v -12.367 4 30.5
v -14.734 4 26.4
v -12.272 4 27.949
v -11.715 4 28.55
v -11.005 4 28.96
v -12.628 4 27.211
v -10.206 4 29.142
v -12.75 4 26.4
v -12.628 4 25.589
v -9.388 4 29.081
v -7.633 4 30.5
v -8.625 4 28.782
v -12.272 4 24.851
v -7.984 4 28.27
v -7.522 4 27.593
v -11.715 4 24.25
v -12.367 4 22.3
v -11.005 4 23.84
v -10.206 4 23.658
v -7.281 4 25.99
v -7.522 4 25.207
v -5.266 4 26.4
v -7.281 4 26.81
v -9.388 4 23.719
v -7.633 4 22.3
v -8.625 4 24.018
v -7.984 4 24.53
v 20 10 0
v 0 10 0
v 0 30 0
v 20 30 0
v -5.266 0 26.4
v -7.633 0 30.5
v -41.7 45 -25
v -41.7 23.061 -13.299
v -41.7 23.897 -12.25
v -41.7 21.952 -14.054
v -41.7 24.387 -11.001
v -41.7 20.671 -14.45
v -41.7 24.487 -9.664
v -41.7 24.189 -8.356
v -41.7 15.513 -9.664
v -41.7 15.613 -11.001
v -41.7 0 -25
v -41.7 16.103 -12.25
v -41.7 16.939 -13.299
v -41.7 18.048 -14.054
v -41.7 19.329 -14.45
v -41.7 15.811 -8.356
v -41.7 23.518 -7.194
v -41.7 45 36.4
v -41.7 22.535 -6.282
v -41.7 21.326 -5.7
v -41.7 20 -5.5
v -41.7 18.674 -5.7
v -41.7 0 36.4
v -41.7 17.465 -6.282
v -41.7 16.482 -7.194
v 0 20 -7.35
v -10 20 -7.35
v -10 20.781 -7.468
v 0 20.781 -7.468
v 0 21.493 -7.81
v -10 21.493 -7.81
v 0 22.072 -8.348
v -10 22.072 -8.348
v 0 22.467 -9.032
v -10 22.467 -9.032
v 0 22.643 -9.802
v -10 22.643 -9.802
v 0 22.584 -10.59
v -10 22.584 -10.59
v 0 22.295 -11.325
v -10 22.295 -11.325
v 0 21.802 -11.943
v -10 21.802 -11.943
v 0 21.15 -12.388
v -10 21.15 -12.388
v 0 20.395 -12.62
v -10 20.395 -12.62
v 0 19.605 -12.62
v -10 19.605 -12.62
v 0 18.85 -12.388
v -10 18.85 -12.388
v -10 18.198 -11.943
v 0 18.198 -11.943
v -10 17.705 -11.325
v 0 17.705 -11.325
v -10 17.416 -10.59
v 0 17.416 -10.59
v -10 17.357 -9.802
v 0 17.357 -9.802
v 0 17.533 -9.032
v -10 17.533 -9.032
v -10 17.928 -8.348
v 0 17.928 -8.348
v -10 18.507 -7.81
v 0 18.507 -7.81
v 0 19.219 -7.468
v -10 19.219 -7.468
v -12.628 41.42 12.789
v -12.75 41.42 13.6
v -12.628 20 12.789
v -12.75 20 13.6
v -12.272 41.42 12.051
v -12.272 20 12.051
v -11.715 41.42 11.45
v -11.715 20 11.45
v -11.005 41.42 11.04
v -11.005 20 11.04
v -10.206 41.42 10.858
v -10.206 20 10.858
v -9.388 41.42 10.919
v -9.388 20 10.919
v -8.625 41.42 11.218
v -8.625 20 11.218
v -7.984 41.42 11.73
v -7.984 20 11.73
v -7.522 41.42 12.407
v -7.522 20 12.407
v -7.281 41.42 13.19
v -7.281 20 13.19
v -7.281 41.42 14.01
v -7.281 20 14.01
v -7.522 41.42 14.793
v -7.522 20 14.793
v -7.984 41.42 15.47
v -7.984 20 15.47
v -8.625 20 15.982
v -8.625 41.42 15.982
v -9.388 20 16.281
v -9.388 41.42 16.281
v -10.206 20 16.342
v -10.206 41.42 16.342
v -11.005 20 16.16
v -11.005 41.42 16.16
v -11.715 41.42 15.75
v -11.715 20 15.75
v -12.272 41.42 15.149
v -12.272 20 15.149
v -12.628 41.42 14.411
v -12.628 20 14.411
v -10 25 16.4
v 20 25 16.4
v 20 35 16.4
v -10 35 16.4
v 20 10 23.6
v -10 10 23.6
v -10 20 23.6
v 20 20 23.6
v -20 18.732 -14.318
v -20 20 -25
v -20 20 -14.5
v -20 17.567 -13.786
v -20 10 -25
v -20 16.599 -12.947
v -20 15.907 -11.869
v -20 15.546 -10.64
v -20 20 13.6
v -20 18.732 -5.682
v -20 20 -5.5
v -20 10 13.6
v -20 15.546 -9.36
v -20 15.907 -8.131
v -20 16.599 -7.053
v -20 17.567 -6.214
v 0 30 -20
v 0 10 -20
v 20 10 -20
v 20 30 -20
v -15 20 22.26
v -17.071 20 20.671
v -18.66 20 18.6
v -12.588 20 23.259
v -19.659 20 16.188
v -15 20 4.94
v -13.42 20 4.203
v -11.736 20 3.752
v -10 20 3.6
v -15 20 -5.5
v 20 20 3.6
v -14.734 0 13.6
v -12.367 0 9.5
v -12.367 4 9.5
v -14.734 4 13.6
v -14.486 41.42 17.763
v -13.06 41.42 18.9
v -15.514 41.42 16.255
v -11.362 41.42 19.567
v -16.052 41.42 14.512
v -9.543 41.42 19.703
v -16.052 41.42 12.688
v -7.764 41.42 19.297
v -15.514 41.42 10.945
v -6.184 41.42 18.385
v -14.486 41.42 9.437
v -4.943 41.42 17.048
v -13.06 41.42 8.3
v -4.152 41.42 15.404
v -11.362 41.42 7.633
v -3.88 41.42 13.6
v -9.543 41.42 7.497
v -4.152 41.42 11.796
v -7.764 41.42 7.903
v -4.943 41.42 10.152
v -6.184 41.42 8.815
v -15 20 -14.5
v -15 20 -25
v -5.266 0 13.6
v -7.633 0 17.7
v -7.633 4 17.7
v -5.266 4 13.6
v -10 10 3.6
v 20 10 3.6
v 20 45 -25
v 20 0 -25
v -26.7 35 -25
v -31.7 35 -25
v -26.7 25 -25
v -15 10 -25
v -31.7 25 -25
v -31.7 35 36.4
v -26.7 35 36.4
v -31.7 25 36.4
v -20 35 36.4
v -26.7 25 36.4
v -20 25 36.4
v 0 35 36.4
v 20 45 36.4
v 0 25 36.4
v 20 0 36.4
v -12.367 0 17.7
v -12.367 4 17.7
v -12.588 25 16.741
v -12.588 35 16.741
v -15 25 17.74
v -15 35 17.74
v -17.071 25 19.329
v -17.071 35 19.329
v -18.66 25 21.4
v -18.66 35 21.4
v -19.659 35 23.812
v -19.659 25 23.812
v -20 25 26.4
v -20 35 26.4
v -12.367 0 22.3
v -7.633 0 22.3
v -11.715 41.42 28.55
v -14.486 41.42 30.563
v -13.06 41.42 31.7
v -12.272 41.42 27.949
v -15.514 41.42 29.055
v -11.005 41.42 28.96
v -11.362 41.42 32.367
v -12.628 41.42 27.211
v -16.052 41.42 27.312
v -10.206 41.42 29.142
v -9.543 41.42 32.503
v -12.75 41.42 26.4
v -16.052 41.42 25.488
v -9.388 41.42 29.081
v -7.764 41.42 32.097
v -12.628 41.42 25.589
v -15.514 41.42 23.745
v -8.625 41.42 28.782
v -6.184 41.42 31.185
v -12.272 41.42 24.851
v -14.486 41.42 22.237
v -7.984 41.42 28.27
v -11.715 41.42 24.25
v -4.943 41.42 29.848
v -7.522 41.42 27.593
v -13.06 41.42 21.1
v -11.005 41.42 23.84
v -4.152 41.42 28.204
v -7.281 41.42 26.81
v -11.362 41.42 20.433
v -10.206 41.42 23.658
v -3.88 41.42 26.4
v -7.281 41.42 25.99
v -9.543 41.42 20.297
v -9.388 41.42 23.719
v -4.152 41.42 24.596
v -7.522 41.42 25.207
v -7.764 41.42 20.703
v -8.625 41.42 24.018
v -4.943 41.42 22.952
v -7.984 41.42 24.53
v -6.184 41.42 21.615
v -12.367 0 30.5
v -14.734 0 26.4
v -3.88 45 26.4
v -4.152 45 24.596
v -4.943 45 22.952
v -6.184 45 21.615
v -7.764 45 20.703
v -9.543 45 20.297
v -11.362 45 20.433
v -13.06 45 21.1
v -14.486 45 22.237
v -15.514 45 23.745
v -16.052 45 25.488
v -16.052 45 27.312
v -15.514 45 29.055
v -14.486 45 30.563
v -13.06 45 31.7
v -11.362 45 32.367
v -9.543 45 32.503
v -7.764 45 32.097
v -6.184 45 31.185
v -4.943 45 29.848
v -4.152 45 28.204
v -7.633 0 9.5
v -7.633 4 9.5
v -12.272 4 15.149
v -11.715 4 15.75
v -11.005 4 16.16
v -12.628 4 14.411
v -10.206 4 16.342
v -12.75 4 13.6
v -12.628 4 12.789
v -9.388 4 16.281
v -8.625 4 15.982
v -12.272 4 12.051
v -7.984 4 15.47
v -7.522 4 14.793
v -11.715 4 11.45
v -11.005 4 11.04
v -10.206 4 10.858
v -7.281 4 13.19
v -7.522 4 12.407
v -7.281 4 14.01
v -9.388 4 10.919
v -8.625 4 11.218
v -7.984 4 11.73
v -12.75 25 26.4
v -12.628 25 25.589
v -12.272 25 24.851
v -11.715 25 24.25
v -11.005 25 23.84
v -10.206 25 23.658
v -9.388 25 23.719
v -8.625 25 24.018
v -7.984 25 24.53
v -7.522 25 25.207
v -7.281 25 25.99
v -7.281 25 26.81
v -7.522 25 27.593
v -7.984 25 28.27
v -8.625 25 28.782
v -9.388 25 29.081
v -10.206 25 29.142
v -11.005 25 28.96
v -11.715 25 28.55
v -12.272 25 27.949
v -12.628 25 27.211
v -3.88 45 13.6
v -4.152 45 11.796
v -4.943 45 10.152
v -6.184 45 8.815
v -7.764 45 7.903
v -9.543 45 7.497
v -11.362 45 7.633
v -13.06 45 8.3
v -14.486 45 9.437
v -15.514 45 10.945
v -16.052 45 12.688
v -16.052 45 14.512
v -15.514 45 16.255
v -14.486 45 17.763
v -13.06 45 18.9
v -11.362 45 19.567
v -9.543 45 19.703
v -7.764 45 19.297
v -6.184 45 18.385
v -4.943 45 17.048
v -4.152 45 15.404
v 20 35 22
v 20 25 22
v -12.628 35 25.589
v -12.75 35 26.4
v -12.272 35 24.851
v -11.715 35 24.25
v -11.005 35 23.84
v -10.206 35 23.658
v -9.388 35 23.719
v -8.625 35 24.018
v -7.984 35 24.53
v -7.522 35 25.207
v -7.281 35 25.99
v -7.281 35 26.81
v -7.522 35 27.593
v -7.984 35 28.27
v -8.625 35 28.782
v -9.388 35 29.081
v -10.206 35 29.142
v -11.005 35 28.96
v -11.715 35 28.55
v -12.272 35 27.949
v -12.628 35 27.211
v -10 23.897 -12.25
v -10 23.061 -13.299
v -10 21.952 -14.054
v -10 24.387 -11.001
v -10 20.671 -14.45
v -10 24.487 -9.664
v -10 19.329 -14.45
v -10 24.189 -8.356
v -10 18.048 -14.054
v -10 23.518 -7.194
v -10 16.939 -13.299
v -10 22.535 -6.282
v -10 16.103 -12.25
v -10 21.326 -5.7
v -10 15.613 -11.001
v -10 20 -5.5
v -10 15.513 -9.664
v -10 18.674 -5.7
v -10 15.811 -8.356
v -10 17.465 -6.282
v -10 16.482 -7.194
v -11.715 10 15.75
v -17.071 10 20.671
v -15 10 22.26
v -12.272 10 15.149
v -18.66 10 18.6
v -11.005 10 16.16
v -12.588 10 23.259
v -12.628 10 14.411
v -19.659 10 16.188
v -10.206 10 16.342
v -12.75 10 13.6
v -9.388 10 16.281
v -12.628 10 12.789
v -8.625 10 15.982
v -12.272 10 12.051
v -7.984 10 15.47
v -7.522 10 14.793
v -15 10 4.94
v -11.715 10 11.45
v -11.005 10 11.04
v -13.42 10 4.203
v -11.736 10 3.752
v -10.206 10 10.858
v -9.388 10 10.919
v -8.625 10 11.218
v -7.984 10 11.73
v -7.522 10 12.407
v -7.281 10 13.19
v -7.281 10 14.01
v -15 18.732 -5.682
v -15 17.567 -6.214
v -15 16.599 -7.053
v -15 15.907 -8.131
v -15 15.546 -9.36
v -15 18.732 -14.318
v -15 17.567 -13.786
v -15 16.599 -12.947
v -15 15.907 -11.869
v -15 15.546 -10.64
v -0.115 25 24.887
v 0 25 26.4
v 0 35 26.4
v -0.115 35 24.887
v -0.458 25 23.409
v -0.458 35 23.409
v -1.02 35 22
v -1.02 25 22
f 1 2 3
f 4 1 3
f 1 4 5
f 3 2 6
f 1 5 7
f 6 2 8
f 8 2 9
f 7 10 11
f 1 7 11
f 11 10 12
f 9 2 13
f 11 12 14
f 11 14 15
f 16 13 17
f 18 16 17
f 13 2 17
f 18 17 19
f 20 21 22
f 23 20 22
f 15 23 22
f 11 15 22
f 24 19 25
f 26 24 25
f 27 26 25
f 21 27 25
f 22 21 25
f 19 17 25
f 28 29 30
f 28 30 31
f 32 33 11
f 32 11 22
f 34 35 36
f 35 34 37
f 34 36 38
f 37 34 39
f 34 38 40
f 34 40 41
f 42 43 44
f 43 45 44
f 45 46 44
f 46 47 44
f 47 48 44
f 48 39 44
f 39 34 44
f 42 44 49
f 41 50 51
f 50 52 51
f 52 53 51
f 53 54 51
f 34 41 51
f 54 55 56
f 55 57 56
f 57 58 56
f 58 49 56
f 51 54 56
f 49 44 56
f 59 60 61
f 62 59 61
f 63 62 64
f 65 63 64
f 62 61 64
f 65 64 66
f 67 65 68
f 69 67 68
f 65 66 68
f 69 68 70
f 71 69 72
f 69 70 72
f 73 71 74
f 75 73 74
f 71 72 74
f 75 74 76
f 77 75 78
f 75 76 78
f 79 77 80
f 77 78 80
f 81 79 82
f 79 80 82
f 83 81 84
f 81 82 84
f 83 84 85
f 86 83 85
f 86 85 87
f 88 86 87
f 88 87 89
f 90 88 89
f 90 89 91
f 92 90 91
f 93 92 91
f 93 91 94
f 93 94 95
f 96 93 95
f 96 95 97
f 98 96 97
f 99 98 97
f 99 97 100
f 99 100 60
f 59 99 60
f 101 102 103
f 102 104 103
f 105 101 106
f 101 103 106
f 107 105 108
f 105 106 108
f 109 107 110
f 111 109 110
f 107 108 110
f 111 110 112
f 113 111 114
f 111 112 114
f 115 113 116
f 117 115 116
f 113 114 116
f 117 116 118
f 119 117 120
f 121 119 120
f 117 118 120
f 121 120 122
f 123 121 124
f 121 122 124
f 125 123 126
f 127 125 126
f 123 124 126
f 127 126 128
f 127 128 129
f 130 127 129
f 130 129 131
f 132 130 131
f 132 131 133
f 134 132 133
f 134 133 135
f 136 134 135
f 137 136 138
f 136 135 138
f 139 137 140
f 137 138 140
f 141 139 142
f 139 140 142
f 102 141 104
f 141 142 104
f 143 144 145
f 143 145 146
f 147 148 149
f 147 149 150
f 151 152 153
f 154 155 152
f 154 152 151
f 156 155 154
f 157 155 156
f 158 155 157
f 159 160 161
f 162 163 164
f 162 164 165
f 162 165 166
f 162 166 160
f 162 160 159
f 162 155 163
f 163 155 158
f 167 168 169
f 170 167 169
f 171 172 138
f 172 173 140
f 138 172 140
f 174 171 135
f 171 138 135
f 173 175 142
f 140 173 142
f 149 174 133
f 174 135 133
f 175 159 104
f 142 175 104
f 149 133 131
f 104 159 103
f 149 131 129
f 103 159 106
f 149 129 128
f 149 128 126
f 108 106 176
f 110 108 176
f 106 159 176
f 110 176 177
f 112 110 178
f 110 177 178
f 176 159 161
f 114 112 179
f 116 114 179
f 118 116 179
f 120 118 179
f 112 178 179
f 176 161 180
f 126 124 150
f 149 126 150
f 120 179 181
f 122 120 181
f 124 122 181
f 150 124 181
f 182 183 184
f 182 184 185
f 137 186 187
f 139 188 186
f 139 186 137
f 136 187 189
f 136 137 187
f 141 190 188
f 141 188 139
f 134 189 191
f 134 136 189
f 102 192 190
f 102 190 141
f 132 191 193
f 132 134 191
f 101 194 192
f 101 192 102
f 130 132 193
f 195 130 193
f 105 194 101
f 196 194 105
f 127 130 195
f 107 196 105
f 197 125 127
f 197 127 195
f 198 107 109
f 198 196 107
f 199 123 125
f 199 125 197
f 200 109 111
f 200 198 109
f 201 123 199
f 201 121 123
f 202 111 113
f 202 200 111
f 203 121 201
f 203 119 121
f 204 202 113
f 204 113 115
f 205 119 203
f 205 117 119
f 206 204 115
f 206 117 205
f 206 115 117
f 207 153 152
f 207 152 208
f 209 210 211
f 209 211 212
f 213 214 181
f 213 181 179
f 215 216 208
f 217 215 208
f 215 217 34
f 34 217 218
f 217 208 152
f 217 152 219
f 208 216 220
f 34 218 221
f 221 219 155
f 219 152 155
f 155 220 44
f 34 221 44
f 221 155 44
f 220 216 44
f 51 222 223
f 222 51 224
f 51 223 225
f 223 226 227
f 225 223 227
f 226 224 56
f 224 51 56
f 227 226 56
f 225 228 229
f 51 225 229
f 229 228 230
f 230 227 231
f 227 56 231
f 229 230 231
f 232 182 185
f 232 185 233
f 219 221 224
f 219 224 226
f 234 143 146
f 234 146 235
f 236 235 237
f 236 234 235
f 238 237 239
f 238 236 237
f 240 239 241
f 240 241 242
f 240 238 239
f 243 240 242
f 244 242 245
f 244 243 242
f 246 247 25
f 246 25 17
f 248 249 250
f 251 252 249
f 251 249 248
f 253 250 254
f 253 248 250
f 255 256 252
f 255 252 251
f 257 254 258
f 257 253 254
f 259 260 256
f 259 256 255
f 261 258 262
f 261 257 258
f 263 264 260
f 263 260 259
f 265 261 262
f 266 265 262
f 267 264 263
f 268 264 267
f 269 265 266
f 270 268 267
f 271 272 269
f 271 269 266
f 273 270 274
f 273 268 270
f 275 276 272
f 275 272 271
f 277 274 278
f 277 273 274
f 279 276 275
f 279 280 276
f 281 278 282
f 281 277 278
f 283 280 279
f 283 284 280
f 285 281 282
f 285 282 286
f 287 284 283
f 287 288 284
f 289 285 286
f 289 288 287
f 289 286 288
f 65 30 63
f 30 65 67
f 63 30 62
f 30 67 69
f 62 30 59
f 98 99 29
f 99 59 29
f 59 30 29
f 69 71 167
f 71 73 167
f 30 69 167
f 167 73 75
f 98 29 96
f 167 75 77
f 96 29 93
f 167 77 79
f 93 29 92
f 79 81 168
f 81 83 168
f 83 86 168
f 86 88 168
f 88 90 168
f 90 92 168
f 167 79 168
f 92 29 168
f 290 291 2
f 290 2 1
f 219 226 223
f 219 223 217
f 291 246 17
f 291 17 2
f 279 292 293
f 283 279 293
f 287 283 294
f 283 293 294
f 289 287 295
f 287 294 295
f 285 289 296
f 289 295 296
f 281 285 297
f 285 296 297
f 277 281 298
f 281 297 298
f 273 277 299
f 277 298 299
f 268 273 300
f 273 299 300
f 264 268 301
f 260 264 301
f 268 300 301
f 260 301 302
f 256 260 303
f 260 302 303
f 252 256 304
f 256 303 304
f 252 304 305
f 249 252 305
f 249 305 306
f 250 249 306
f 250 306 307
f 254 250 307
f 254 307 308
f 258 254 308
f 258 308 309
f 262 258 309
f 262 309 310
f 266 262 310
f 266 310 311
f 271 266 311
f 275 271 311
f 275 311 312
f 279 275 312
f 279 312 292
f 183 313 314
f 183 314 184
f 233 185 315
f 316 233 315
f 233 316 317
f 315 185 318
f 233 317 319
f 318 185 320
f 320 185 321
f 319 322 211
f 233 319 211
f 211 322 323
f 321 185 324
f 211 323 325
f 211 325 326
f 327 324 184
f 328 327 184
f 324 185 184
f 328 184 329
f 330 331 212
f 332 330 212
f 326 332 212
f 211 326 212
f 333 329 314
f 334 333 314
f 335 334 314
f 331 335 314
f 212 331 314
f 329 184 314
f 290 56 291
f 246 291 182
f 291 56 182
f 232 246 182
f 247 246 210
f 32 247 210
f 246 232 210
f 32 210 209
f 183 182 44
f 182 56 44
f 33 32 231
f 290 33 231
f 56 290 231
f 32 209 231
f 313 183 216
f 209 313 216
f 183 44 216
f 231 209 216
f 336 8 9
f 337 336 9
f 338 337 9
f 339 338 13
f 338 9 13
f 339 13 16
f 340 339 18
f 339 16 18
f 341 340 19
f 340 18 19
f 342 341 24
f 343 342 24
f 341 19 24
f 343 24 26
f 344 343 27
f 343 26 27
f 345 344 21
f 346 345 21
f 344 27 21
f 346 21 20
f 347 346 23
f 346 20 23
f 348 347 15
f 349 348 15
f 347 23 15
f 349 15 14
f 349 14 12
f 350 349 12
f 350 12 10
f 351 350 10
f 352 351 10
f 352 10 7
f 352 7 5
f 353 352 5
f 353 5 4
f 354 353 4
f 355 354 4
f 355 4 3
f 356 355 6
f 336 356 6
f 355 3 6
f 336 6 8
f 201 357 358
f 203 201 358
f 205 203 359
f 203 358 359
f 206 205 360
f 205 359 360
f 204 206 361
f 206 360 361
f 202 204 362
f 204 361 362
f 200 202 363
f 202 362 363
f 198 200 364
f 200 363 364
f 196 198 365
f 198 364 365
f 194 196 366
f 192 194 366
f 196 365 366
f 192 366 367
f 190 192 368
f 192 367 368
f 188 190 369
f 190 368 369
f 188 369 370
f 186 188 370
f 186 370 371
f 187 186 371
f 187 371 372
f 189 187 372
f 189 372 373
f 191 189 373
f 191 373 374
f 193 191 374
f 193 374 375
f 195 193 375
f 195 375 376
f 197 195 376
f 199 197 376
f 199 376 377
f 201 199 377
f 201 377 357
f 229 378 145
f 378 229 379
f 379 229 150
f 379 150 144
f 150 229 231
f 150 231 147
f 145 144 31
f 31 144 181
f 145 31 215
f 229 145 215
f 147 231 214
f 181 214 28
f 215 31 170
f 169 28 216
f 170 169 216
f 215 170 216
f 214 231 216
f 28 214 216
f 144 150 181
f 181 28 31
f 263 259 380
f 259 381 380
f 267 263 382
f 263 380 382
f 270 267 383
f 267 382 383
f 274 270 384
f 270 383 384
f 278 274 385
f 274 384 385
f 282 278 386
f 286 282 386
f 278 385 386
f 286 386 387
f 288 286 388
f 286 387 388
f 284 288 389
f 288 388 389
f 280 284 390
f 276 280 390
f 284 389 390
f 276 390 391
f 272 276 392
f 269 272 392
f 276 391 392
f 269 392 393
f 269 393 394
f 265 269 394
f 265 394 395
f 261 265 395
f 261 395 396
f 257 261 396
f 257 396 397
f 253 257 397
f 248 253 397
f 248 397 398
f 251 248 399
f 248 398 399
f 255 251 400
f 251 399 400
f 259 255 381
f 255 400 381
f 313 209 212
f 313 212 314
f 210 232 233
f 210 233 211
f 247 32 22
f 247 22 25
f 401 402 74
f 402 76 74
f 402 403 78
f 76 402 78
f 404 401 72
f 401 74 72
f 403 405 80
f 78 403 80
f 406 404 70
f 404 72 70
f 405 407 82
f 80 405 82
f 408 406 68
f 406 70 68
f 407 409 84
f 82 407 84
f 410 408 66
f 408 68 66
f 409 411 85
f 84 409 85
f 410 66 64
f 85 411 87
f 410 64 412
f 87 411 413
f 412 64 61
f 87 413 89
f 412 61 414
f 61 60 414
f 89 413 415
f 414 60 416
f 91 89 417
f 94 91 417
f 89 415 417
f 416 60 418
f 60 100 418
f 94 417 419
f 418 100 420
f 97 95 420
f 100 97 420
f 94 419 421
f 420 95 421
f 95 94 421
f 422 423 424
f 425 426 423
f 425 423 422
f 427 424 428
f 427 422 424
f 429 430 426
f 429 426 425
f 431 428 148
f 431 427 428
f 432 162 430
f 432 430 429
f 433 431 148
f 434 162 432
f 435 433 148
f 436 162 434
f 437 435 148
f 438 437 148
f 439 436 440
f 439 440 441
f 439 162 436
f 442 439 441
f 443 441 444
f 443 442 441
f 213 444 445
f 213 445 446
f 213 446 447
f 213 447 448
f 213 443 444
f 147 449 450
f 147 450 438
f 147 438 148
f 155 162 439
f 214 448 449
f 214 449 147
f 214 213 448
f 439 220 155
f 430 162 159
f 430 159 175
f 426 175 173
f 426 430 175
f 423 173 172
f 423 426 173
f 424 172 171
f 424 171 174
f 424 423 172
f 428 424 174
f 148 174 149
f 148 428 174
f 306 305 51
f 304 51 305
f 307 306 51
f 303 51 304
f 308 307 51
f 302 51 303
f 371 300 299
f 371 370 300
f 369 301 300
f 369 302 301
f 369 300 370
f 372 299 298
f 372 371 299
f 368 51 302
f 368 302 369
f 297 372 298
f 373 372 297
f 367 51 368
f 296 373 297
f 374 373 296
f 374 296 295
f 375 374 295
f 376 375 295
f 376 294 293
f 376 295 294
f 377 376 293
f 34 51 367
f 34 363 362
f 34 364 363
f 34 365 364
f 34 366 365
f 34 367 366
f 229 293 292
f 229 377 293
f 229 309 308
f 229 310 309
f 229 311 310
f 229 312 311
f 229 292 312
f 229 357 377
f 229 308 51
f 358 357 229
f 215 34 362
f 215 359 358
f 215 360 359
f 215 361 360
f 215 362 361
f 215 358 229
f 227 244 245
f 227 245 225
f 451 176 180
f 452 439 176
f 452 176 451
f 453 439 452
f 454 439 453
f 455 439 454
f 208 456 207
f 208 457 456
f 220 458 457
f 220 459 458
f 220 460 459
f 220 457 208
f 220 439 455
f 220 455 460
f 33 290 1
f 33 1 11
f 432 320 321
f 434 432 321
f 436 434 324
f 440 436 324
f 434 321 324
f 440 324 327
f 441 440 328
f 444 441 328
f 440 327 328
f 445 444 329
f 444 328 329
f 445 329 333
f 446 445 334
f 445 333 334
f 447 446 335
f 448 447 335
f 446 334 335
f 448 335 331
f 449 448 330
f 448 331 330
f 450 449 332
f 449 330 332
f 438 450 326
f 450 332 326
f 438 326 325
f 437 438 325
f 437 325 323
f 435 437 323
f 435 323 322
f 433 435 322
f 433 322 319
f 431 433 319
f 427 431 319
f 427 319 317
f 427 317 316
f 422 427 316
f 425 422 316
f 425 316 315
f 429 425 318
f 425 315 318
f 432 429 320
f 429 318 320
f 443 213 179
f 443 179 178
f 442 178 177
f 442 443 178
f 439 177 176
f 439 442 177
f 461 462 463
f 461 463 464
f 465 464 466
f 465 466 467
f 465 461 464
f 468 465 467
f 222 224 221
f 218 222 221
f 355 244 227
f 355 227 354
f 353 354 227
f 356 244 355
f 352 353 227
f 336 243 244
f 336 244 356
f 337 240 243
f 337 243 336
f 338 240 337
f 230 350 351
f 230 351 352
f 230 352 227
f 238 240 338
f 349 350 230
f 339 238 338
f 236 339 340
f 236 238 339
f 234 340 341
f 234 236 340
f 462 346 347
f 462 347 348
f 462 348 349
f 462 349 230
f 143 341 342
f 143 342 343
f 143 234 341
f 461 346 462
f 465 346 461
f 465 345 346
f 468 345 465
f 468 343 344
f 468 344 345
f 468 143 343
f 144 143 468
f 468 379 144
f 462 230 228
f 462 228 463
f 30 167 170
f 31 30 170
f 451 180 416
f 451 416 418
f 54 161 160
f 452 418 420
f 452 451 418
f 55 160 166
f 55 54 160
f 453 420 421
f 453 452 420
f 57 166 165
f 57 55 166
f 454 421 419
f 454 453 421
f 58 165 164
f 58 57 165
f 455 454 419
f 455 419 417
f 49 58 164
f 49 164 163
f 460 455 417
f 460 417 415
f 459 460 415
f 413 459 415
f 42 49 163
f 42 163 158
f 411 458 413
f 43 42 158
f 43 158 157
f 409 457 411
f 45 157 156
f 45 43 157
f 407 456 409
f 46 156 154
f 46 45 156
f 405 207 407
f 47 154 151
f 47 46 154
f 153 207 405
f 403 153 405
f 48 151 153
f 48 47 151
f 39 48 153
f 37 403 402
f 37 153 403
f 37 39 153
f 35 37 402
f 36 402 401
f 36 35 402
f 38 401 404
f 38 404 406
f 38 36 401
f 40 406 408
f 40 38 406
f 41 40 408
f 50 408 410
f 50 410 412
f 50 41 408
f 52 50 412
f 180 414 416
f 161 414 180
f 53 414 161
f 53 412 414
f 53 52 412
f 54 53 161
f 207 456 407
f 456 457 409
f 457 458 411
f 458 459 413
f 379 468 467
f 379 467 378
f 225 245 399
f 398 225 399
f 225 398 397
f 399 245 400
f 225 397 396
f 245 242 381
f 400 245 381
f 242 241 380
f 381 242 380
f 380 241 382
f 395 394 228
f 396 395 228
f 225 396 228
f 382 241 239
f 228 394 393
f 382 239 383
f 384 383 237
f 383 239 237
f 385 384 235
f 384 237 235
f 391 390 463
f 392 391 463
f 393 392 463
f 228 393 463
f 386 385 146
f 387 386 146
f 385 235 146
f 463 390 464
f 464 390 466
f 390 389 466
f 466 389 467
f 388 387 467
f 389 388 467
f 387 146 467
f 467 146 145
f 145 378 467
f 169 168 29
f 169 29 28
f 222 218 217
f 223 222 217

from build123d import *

# Parameters (mm, degrees)
MAIN_BLOCK_DEPTH                        = 45
BOTTOM_IDLER_CUTOUT_DEPTH               = 10
TOP_IDLER_CUTOUT_DEPTH                  = 10
BELT_PASSTHROUGH_SKETCH_W               = 5
BELT_PASSTHROUGH_SKETCH_H               = 61.4
BELT_PASSTHROUGH_DEPTH                  = 10
F_2020VSLOTCUTOUTSKETCH_W               = 20
F_2020VSLOTCUTOUTSKETCH_H               = 20
EXTRUSIONMOUNTINGSLOT_DEPTH             = 20
CBORE_FOR_M5_HEX_HEAD_BOLT1_D           = 5.5
CBORE_FOR_M5_HEX_HEAD_BOLT1_CBORE_D     = 12.24
CBORE_FOR_M5_HEX_HEAD_BOLT1_CBORE_DEPTH = 3.58
NUTTRAPS_DEPTH                          = 4
EXTRUSIONMOUNTINGCOUNTERBORESKETCH_R    = 4.5
EXTRUSIONMOUNTINGCOUNTERBORE_DEPTH      = 31.7
EXTRUSIONMOUNTINGHOLESKETCH_R           = 2.65
EXTRUSIONMOUNTINGHOLE_DEPTH             = 66.991287304


with BuildPart() as part:
    # MainBlockSketch → Main Block (new body)
    with BuildSketch(Plane(origin=(0, 0, 0), x_dir=(1, 0, 0), z_dir=(0, 1, 0))):
        Polygon((-41.7, -36.4), (20, -36.4), (20, -20), (20, -15), (20, 0), (20, 20), (20, 25), (-41.7, 25), (-41.7, 20), (-41.7, -15), align=None)
    extrude(amount=MAIN_BLOCK_DEPTH)

    # Bottom Idler Cutout Sketch → Bottom Idler Cutout (cut)
    with BuildSketch(Plane(origin=(0, 10, 0), x_dir=(1, 0, 0), z_dir=(0, 1, 0))):
        with BuildLine():
            Line((-10, -23.6), (20, -23.6))
            Line((20, -23.6), (20, -3.6))
            Line((20, -3.6), (-10, -3.6))
            ThreePointArc((-10, -3.6), (-12.588190451, -3.940741737), (-15, -4.939745962))
            Line((-15, -4.939745962), (-15, 25))
            Line((-15, 25), (-20, 25))
            Line((-20, 25), (-20, -13.6))
            ThreePointArc((-20, -13.6), (-17.071067812, -20.671067812), (-10, -23.6))
        make_face()
    extrude(amount=BOTTOM_IDLER_CUTOUT_DEPTH, mode=Mode.SUBTRACT)

    # Top Idler Cutout Sketch → Top Idler Cutout (cut)
    with BuildSketch(Plane(origin=(0, 25, 0), x_dir=(1, 0, 0), z_dir=(0, 1, 0))):
        with BuildLine():
            Line((-20, -26.4), (-20, -36.4))
            Line((-20, -36.4), (0, -36.4))
            Line((0, -36.4), (0, -26.4))
            ThreePointArc((0, -26.4), (-0.258342613, -24.141657387), (-1.020022272, -22))
            Line((-1.020022272, -22), (20, -22))
            Line((20, -22), (20, -16.4))
            Line((20, -16.4), (-10, -16.4))
            ThreePointArc((-10, -16.4), (-17.071067812, -19.328932188), (-20, -26.4))
        make_face()
    extrude(amount=TOP_IDLER_CUTOUT_DEPTH, mode=Mode.SUBTRACT)

    # Belt Passthrough Sketch → Belt Passthrough (cut)
    with BuildSketch(Plane(origin=(0, 25, 0), x_dir=(1, 0, 0), z_dir=(0, 1, 0))):
        with Locations((-29.2, -5.7)):
            Rectangle(BELT_PASSTHROUGH_SKETCH_W, BELT_PASSTHROUGH_SKETCH_H)
    extrude(amount=BELT_PASSTHROUGH_DEPTH, mode=Mode.SUBTRACT)

    # 2020VSlotCutoutSketch → ExtrusionMountingSlot (cut)
    with BuildSketch(Plane(origin=(0, 10, 0), x_dir=(1, 0, 0), z_dir=(0, 1, 0))):
        with Locations((10, 10)):
            Rectangle(F_2020VSLOTCUTOUTSKETCH_W, F_2020VSLOTCUTOUTSKETCH_H)
    extrude(amount=EXTRUSIONMOUNTINGSLOT_DEPTH, mode=Mode.SUBTRACT)

    # CBORE for M5 Hex Head Bolt1 (through all)
    with Locations(Plane(origin=(0, 45, 0), x_dir=(1, 0, 0), z_dir=(0, 1, 0))):
        with Locations((-10, -26.4), (-10, -13.6)):
            CounterBoreHole(CBORE_FOR_M5_HEX_HEAD_BOLT1_D / 2, CBORE_FOR_M5_HEX_HEAD_BOLT1_CBORE_D / 2, CBORE_FOR_M5_HEX_HEAD_BOLT1_CBORE_DEPTH)

    # Nut Trap Sketch → NutTraps (cut)
    with BuildSketch(Plane(origin=(0, 0, 0), x_dir=(1, 0, 0), z_dir=(0, 1, 0))):
        Polygon((-7.632863896, -9.5), (-12.367136104, -9.5), (-14.734272207, -13.6), (-12.367136104, -17.7), (-7.632863896, -17.7), (-5.265727793, -13.6), align=None)
        Polygon((-7.632863896, -22.3), (-12.367136104, -22.3), (-14.734272207, -26.4), (-12.367136104, -30.5), (-7.632863896, -30.5), (-5.265727793, -26.4), align=None)
    extrude(amount=NUTTRAPS_DEPTH, mode=Mode.SUBTRACT)

    # ExtrusionMountingCounterBoreSketch → ExtrusionMountingCounterbore (cut)
    with BuildSketch(Plane(origin=(-41.7, 0, 0), x_dir=(0, 0, -1), z_dir=(1, 0, 0))):
        with Locations(Location((10, 20, 0), (0, 0, 180))):
            Circle(EXTRUSIONMOUNTINGCOUNTERBORESKETCH_R)
    extrude(amount=EXTRUSIONMOUNTINGCOUNTERBORE_DEPTH, mode=Mode.SUBTRACT)

    # ExtrusionMountingHoleSketch → extrusionMountingHole (cut, through all)
    with BuildSketch(Plane.ZY.offset(10)):
        with Locations((-10, 20)):
            Circle(EXTRUSIONMOUNTINGHOLESKETCH_R)
    extrude(amount=-EXTRUSIONMOUNTINGHOLE_DEPTH, mode=Mode.SUBTRACT)


solid = part.part
